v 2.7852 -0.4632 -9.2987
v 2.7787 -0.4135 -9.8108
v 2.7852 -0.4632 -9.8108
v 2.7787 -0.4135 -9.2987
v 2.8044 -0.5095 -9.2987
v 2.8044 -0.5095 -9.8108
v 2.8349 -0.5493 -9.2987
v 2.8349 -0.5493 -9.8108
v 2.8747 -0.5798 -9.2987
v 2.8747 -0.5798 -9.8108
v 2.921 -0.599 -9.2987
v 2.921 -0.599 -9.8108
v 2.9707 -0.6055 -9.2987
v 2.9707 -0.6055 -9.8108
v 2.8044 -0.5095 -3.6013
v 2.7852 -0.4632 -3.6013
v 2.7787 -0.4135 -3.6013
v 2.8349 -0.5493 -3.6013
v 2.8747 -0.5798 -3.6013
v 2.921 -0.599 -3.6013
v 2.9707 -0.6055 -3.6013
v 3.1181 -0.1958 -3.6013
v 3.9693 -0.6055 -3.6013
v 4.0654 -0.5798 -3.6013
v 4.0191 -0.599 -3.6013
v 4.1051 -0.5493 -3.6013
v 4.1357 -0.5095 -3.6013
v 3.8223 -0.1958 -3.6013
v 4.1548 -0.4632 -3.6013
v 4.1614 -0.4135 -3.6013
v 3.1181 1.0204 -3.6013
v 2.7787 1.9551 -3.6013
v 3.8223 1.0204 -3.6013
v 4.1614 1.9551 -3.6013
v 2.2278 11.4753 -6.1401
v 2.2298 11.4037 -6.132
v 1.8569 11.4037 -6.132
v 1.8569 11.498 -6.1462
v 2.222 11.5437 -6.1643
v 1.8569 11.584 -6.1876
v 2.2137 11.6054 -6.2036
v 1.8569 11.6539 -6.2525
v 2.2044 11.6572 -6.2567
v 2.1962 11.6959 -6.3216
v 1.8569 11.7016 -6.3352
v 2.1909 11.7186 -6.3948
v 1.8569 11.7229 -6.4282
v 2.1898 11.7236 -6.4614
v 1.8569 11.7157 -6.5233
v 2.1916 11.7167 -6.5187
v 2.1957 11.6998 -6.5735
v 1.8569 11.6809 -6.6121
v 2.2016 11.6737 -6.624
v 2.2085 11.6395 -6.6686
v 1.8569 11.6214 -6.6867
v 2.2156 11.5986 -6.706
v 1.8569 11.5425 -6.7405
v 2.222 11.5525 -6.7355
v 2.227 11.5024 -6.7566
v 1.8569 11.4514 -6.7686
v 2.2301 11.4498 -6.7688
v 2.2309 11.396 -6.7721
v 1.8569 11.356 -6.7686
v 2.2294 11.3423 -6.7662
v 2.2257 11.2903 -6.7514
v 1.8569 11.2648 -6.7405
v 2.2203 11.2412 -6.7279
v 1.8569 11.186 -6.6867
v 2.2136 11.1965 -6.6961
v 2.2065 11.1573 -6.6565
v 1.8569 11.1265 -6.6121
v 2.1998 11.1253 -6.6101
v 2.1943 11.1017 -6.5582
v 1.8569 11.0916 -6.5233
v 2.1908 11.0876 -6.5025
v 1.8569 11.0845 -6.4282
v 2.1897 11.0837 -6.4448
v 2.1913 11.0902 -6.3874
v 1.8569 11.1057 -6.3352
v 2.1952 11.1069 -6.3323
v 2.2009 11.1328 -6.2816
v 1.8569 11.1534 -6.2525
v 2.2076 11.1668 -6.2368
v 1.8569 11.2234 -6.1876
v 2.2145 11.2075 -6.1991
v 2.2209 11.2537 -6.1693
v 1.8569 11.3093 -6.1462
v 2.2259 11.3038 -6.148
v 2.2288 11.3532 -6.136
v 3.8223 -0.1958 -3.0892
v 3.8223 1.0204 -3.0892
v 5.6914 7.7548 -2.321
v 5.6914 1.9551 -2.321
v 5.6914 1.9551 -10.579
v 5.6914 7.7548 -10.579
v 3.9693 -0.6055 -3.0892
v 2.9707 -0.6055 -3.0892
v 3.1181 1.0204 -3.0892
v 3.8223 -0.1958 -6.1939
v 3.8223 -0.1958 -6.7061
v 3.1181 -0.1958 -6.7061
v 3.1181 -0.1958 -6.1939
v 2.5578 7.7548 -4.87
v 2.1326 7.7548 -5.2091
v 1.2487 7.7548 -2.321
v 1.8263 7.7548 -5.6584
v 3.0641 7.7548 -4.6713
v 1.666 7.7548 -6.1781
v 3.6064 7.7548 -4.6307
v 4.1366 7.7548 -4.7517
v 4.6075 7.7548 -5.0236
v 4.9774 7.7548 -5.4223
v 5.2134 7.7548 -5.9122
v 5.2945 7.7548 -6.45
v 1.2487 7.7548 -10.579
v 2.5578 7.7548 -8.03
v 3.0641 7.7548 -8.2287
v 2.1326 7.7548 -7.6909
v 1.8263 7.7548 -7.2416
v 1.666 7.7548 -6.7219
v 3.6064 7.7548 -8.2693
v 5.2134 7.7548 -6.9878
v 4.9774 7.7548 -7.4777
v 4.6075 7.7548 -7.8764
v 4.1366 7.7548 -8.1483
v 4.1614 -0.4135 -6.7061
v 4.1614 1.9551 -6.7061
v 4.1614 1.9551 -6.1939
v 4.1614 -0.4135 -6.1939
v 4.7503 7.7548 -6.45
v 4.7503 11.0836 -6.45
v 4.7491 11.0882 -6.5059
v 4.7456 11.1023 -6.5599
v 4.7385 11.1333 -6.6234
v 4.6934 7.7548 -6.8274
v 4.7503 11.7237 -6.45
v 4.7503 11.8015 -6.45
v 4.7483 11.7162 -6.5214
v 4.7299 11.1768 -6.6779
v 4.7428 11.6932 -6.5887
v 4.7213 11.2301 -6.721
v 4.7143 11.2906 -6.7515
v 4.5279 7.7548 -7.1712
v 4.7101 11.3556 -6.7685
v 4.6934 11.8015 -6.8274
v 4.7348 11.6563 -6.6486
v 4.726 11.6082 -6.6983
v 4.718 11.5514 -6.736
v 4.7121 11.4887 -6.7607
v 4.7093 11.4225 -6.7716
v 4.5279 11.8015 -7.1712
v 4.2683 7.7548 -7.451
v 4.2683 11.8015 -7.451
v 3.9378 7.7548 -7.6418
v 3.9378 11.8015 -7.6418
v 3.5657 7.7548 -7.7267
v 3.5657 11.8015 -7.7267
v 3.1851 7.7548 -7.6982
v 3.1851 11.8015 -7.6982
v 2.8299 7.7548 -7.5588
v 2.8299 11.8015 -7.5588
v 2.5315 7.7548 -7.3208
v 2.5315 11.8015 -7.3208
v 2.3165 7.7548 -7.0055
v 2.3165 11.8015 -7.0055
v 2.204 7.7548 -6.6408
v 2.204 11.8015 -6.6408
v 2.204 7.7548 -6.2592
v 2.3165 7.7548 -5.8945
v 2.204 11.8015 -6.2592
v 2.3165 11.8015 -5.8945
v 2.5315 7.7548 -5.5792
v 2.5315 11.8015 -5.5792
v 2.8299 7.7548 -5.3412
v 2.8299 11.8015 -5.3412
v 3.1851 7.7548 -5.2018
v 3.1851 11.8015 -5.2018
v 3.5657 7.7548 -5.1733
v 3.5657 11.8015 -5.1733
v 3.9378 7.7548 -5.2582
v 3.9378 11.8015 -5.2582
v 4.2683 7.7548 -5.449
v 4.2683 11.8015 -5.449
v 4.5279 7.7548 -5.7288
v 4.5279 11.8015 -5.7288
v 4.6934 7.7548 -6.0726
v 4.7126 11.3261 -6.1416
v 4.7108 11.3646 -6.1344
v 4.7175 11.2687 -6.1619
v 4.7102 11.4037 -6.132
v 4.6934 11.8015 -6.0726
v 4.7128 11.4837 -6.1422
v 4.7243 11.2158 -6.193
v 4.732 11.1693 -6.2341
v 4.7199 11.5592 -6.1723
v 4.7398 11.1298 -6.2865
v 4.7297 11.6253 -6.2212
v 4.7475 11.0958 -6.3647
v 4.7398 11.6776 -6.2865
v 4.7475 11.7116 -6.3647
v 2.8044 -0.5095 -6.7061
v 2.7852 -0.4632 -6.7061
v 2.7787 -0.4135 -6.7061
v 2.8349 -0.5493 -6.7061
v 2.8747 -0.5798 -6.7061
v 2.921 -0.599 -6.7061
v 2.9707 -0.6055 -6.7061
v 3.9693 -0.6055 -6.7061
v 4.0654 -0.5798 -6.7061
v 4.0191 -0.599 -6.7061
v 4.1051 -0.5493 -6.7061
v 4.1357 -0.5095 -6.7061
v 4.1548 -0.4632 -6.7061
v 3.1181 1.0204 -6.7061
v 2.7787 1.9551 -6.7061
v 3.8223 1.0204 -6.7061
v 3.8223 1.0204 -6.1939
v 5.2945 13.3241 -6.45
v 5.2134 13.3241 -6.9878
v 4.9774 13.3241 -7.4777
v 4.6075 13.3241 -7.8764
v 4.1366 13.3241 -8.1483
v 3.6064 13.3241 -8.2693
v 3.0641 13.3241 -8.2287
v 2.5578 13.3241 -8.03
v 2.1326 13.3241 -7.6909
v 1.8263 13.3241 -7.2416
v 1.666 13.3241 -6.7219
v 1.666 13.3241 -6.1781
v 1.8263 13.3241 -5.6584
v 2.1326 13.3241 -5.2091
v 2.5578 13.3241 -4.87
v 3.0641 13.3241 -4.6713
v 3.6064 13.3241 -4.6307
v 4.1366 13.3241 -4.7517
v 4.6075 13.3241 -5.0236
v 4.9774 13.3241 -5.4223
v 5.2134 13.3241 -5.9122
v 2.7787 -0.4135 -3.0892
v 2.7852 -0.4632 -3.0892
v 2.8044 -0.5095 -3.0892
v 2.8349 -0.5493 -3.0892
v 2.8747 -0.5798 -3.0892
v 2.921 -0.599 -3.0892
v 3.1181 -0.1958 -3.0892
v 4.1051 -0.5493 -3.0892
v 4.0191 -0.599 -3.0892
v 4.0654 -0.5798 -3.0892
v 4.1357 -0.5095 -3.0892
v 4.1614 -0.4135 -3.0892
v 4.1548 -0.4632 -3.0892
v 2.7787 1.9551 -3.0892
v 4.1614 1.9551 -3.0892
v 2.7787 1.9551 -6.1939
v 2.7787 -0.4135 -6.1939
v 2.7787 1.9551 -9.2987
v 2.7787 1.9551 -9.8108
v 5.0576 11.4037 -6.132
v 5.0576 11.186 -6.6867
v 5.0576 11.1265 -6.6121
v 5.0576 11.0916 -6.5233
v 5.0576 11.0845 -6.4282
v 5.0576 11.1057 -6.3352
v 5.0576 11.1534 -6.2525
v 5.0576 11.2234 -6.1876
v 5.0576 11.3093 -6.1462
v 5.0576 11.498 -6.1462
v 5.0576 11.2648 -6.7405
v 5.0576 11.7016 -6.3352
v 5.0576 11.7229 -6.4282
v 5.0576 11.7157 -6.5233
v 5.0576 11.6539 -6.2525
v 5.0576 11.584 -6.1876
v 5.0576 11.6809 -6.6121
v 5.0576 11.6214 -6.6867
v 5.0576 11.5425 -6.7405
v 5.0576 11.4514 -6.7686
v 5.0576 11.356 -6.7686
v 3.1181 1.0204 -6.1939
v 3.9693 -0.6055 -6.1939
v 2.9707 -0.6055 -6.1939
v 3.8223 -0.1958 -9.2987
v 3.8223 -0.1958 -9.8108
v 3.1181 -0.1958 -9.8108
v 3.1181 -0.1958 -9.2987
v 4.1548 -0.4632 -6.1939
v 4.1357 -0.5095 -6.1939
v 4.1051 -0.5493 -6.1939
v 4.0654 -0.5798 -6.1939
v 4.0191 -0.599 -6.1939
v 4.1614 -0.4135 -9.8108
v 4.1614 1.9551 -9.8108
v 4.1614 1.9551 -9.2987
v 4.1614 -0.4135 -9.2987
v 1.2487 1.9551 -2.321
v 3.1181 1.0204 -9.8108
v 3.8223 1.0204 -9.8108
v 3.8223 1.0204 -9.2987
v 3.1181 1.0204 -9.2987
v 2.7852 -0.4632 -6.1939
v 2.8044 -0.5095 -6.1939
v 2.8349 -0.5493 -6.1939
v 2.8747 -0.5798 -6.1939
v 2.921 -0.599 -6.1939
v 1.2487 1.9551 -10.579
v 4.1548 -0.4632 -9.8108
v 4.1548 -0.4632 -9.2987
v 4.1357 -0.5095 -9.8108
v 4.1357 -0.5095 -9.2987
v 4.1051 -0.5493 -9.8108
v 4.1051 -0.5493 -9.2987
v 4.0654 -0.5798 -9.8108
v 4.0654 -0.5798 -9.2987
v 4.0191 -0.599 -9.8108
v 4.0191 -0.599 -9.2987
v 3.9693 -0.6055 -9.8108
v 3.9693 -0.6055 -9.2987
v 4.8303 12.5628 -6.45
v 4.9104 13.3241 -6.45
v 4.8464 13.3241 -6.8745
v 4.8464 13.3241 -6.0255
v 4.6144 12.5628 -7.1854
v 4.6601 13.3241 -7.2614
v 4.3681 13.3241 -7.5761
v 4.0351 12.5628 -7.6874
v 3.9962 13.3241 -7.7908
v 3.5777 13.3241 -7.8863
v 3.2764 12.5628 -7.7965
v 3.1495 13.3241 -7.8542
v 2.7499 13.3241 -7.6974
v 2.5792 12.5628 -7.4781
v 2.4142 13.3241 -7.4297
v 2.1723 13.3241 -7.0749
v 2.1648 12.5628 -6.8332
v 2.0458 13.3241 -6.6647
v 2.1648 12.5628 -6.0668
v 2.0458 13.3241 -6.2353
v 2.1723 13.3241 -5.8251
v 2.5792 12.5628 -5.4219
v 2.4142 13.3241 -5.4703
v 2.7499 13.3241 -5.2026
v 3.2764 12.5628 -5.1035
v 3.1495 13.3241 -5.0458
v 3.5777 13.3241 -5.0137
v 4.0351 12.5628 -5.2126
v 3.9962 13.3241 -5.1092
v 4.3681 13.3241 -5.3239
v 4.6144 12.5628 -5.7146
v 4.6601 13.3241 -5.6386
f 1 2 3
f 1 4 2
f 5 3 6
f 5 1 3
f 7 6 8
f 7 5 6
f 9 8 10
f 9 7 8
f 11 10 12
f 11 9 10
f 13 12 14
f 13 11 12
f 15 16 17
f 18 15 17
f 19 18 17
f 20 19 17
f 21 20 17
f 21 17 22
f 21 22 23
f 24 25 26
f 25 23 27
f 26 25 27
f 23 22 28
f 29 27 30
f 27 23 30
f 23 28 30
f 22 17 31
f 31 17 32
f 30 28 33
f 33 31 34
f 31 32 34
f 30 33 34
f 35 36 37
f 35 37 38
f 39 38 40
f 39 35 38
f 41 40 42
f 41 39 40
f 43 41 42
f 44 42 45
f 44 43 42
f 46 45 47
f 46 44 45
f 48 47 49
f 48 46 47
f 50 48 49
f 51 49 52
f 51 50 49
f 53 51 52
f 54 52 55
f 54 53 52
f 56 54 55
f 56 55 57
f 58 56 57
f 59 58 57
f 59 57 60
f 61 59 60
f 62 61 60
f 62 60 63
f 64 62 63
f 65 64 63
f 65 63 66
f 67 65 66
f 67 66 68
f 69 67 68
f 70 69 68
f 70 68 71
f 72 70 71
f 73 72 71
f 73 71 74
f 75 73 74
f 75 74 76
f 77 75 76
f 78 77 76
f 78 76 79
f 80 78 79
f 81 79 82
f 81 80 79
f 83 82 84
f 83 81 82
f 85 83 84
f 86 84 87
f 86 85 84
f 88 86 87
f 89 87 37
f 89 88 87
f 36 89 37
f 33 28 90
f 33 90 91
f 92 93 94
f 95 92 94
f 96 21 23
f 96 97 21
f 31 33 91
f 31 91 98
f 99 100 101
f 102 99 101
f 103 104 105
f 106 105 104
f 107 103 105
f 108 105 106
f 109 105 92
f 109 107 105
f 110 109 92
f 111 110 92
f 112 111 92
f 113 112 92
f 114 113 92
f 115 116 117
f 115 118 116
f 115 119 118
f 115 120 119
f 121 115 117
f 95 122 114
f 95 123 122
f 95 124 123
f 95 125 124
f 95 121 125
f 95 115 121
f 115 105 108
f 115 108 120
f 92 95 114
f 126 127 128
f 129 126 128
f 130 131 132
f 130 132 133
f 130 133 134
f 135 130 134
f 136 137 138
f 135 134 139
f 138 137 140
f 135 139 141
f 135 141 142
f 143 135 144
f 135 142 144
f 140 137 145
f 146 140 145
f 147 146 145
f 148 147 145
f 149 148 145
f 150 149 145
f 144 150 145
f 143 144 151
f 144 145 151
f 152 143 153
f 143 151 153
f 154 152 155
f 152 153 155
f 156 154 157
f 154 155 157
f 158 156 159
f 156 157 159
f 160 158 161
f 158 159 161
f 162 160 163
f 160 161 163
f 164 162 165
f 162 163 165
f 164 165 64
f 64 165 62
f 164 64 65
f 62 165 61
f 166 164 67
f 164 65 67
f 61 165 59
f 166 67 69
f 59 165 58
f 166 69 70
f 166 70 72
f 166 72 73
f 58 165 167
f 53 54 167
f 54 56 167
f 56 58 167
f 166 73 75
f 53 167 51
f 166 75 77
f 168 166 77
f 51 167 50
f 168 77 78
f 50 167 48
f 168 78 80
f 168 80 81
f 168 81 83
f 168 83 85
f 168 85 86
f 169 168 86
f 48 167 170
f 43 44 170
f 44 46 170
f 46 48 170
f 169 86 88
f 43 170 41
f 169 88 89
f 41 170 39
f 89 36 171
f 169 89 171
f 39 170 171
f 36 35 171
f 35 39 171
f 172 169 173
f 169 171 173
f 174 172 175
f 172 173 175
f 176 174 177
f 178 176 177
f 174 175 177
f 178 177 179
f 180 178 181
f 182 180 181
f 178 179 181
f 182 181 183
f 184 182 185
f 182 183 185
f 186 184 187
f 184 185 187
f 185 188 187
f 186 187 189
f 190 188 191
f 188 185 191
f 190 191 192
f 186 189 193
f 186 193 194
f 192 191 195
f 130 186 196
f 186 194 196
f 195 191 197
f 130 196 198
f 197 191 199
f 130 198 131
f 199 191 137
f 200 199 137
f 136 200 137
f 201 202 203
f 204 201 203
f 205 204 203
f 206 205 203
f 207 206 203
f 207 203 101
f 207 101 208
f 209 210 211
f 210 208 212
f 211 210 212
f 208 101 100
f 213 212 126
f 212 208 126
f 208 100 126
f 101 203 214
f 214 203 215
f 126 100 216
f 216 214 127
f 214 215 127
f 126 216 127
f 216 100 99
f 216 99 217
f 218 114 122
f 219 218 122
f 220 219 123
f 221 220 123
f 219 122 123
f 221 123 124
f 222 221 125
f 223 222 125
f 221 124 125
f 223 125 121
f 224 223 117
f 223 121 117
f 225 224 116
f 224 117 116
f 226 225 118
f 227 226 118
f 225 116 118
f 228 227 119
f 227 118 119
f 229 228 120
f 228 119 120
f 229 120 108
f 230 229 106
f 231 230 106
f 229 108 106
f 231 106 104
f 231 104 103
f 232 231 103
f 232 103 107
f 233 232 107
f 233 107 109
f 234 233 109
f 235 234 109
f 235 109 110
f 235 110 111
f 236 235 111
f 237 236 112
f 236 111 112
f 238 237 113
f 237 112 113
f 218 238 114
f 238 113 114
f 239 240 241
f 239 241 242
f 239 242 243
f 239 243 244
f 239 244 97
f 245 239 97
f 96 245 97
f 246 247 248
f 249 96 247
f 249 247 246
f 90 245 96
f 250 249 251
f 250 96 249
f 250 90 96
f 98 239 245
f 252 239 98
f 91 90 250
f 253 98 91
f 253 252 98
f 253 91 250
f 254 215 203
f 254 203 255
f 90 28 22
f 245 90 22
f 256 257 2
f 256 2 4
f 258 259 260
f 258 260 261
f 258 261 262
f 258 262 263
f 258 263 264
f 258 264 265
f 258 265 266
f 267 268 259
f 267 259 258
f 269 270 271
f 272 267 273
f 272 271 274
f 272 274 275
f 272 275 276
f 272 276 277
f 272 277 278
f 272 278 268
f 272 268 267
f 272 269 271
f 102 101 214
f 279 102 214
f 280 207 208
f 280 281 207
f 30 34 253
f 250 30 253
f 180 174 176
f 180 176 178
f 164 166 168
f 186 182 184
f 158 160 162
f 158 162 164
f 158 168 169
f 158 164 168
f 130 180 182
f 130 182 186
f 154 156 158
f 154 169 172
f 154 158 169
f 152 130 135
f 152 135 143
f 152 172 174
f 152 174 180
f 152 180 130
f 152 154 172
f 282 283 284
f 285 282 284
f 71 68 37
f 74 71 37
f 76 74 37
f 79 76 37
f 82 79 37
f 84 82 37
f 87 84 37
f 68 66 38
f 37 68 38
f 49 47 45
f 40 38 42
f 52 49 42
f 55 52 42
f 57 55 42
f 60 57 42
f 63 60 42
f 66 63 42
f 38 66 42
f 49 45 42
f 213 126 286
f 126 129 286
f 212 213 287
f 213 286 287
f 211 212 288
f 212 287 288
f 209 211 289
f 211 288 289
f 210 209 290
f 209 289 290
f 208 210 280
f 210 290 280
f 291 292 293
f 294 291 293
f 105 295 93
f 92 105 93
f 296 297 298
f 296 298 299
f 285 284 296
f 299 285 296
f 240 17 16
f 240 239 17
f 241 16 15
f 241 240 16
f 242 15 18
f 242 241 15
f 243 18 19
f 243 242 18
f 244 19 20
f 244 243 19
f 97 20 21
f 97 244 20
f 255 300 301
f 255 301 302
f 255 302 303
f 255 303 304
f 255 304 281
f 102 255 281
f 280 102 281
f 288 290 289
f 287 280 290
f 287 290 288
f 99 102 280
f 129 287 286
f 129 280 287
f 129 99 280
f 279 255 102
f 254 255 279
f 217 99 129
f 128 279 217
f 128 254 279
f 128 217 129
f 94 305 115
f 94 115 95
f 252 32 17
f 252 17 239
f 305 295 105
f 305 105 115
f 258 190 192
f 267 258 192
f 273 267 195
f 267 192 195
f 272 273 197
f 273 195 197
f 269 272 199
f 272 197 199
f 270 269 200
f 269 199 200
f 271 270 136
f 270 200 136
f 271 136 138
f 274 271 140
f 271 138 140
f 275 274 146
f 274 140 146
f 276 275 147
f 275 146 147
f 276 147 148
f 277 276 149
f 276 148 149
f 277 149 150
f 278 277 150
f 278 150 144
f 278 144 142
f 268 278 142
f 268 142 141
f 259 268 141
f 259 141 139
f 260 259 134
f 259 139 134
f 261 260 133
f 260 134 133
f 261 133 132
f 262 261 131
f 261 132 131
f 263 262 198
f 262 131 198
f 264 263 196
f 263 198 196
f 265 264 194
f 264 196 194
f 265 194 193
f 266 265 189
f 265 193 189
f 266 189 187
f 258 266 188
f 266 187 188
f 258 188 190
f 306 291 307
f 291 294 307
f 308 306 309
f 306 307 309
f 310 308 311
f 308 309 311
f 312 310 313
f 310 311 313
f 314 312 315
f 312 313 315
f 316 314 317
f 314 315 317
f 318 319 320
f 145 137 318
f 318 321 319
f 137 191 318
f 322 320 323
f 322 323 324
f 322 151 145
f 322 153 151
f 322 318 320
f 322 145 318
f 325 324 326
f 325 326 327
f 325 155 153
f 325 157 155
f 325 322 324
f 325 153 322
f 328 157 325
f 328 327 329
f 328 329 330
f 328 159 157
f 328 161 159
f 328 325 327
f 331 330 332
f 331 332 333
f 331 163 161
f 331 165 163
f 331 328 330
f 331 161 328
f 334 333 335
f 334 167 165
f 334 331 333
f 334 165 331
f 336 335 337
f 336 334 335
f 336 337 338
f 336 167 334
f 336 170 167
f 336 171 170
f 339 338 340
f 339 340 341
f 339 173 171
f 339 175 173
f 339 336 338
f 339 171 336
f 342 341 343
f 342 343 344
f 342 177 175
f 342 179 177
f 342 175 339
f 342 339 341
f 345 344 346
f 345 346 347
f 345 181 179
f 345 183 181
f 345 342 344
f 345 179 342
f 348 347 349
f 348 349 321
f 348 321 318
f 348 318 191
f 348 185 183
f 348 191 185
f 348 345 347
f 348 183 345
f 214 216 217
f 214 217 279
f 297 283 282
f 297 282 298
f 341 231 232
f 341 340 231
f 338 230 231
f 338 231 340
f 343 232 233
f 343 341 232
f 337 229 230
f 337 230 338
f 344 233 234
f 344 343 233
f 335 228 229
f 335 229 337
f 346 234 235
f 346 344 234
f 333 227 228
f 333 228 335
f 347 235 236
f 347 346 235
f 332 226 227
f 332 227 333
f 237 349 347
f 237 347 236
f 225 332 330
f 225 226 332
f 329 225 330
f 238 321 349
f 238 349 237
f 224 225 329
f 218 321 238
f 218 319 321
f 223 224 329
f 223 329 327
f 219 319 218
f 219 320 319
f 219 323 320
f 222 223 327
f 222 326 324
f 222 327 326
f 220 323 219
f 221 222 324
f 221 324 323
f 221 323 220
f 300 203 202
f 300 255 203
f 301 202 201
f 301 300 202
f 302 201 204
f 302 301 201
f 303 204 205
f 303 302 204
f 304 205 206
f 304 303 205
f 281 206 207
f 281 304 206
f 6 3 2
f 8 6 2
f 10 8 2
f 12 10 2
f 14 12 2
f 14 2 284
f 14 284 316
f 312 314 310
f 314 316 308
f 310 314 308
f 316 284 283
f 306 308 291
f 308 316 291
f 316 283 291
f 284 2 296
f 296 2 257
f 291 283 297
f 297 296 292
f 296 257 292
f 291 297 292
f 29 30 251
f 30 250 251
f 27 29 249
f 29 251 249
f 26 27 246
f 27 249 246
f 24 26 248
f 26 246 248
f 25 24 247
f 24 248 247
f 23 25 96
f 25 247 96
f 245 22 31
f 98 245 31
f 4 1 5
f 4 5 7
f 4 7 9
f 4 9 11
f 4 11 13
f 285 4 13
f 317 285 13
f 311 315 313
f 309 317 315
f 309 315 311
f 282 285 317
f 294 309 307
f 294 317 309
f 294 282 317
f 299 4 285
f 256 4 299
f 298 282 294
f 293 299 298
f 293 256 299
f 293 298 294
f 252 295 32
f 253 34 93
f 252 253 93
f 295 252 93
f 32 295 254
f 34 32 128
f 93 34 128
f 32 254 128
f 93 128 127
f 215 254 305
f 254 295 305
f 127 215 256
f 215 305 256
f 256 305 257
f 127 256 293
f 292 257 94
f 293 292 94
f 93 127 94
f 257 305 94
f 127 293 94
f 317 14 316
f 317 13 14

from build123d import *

# Parameters (mm, degrees)
ESQUISSE1_W                  = 6.94
ESQUISSE1_H                  = 12.9
BOSS_EXTRU_1_DEPTH           = 9.06
ESQUISSE2_R                  = 2.85
BOSS_EXTRU_2_DEPTH           = 8.7
ESQUISSE3_R                  = 2
ENL_V_MAT_EXTRU_1_DEPTH      = 8.7
ENL_V_START                  = -3.45
ESQUISSE4_R                  = 0.5
ENL_V_MAT_EXTRU_2_DEPTH      = 2.5
ENL_V_MAT_EXTRU_2_DEPTH_BACK = 2.5
CHANFREIN1_SIZE              = 0.25
CHANFREIN1_SIZE2             = 2.378591114
ESQUISSE5_W                  = 2.16
ESQUISSE5_H                  = 0.8
BOSS_EXTRU_3_DEPTH           = 4
CONG_1_R                     = 0.3
ESQUISSE6_W                  = 1.1
ESQUISSE6_H                  = 1.9
ENL_V_MAT_EXTRU_3_DEPTH      = 12.7
SCALE1_SCALE                 = 0.64015


with BuildPart() as part:
    # Esquisse1 → Boss.-Extru.1 (new body)
    with BuildSketch(Plane(origin=(0, 0, 0), x_dir=(1, 0, 0), z_dir=(0, 1, 0))):
        with Locations((3.47, 6.45)):
            Rectangle(ESQUISSE1_W, ESQUISSE1_H)
    extrude(amount=BOSS_EXTRU_1_DEPTH)

    # Esquisse2 → Boss.-Extru.2 (add)
    with BuildSketch(Plane(origin=(0, 9.06, 0), x_dir=(1, 0, 0), z_dir=(0, 1, 0))):
        with Locations((3.47, 6.45)):
            Circle(ESQUISSE2_R)
    extrude(amount=BOSS_EXTRU_2_DEPTH)

    # Esquisse3 → Enlèv. mat.-Extru.1 (cut)
    with BuildSketch(Plane(origin=(0, 17.76, 0), x_dir=(1, 0, 0), z_dir=(0, 1, 0))):
        with Locations((3.47, 6.45)):
            Circle(ESQUISSE3_R)
    extrude(amount=-ENL_V_MAT_EXTRU_1_DEPTH, mode=Mode.SUBTRACT)

    # Esquisse4 → Enlèv. mat.-Extru.2 (cut, two sides)
    with BuildSketch(Plane.ZY.offset(ENL_V_START)) as enl_v_mat_extru_2_sk:
        with Locations((-6.453279692, 14.76)):
            Circle(ESQUISSE4_R)
    extrude(amount=ENL_V_MAT_EXTRU_2_DEPTH, mode=Mode.SUBTRACT)
    extrude(enl_v_mat_extru_2_sk.sketch, amount=-ENL_V_MAT_EXTRU_2_DEPTH_BACK, mode=Mode.SUBTRACT)

    # Chanfrein1
    chanfrein1_edges = [part.edges().sort_by_distance(p)[0] for p in [
        (1.47, 17.76, -6.45),
    ]]
    chanfrein1_side = [part.faces().sort_by_distance(p)[0] for p in [
        (0.700610173, 17.76, -6.45),
    ]]
    chamfer(chanfrein1_edges, length=CHANFREIN1_SIZE, length2=CHANFREIN1_SIZE2, reference=chanfrein1_side[0])

    # Esquisse5 → Boss.-Extru.3 (add)
    with BuildSketch(Plane.XZ):
        with Locations((3.47, -1.6)):
            Rectangle(ESQUISSE5_W, ESQUISSE5_H)
        with Locations((3.47, -11.3)):
            Rectangle(ESQUISSE5_W, ESQUISSE5_H)
        with Locations((3.47, -6.45)):
            Rectangle(ESQUISSE5_W, ESQUISSE5_H)
    extrude(amount=BOSS_EXTRU_3_DEPTH)

    # Congé1
    cong_1_edges = [part.edges().sort_by_distance(p)[0] for p in [
        (2.39, -4, -1.6),
        (4.55, -4, -1.6),
        (4.55, -4, -11.3),
        (2.39, -4, -11.3),
        (2.39, -4, -6.45),
        (4.55, -4, -6.45),
    ]]
    fillet(cong_1_edges, radius=CONG_1_R)

    # Esquisse6 → Enlèv. mat.-Extru.3 (cut, through all)
    with BuildSketch(Plane(origin=(0, 0, -11.7), x_dir=(-1, 0, 0), z_dir=(0, 0, -1))):
        with Locations((-3.470290463, -2.41)):
            Rectangle(ESQUISSE6_W, ESQUISSE6_H)
    extrude(amount=-ENL_V_MAT_EXTRU_3_DEPTH, mode=Mode.SUBTRACT)


with BuildPart() as part_1:
    # Scale1: scaled about (3.47008246, 5.432983417, -6.449996817)
    add(part.part.scale(SCALE1_SCALE).moved(Location((1.248709173, 1.955059083, -2.321031355))))


solid = part_1.part
